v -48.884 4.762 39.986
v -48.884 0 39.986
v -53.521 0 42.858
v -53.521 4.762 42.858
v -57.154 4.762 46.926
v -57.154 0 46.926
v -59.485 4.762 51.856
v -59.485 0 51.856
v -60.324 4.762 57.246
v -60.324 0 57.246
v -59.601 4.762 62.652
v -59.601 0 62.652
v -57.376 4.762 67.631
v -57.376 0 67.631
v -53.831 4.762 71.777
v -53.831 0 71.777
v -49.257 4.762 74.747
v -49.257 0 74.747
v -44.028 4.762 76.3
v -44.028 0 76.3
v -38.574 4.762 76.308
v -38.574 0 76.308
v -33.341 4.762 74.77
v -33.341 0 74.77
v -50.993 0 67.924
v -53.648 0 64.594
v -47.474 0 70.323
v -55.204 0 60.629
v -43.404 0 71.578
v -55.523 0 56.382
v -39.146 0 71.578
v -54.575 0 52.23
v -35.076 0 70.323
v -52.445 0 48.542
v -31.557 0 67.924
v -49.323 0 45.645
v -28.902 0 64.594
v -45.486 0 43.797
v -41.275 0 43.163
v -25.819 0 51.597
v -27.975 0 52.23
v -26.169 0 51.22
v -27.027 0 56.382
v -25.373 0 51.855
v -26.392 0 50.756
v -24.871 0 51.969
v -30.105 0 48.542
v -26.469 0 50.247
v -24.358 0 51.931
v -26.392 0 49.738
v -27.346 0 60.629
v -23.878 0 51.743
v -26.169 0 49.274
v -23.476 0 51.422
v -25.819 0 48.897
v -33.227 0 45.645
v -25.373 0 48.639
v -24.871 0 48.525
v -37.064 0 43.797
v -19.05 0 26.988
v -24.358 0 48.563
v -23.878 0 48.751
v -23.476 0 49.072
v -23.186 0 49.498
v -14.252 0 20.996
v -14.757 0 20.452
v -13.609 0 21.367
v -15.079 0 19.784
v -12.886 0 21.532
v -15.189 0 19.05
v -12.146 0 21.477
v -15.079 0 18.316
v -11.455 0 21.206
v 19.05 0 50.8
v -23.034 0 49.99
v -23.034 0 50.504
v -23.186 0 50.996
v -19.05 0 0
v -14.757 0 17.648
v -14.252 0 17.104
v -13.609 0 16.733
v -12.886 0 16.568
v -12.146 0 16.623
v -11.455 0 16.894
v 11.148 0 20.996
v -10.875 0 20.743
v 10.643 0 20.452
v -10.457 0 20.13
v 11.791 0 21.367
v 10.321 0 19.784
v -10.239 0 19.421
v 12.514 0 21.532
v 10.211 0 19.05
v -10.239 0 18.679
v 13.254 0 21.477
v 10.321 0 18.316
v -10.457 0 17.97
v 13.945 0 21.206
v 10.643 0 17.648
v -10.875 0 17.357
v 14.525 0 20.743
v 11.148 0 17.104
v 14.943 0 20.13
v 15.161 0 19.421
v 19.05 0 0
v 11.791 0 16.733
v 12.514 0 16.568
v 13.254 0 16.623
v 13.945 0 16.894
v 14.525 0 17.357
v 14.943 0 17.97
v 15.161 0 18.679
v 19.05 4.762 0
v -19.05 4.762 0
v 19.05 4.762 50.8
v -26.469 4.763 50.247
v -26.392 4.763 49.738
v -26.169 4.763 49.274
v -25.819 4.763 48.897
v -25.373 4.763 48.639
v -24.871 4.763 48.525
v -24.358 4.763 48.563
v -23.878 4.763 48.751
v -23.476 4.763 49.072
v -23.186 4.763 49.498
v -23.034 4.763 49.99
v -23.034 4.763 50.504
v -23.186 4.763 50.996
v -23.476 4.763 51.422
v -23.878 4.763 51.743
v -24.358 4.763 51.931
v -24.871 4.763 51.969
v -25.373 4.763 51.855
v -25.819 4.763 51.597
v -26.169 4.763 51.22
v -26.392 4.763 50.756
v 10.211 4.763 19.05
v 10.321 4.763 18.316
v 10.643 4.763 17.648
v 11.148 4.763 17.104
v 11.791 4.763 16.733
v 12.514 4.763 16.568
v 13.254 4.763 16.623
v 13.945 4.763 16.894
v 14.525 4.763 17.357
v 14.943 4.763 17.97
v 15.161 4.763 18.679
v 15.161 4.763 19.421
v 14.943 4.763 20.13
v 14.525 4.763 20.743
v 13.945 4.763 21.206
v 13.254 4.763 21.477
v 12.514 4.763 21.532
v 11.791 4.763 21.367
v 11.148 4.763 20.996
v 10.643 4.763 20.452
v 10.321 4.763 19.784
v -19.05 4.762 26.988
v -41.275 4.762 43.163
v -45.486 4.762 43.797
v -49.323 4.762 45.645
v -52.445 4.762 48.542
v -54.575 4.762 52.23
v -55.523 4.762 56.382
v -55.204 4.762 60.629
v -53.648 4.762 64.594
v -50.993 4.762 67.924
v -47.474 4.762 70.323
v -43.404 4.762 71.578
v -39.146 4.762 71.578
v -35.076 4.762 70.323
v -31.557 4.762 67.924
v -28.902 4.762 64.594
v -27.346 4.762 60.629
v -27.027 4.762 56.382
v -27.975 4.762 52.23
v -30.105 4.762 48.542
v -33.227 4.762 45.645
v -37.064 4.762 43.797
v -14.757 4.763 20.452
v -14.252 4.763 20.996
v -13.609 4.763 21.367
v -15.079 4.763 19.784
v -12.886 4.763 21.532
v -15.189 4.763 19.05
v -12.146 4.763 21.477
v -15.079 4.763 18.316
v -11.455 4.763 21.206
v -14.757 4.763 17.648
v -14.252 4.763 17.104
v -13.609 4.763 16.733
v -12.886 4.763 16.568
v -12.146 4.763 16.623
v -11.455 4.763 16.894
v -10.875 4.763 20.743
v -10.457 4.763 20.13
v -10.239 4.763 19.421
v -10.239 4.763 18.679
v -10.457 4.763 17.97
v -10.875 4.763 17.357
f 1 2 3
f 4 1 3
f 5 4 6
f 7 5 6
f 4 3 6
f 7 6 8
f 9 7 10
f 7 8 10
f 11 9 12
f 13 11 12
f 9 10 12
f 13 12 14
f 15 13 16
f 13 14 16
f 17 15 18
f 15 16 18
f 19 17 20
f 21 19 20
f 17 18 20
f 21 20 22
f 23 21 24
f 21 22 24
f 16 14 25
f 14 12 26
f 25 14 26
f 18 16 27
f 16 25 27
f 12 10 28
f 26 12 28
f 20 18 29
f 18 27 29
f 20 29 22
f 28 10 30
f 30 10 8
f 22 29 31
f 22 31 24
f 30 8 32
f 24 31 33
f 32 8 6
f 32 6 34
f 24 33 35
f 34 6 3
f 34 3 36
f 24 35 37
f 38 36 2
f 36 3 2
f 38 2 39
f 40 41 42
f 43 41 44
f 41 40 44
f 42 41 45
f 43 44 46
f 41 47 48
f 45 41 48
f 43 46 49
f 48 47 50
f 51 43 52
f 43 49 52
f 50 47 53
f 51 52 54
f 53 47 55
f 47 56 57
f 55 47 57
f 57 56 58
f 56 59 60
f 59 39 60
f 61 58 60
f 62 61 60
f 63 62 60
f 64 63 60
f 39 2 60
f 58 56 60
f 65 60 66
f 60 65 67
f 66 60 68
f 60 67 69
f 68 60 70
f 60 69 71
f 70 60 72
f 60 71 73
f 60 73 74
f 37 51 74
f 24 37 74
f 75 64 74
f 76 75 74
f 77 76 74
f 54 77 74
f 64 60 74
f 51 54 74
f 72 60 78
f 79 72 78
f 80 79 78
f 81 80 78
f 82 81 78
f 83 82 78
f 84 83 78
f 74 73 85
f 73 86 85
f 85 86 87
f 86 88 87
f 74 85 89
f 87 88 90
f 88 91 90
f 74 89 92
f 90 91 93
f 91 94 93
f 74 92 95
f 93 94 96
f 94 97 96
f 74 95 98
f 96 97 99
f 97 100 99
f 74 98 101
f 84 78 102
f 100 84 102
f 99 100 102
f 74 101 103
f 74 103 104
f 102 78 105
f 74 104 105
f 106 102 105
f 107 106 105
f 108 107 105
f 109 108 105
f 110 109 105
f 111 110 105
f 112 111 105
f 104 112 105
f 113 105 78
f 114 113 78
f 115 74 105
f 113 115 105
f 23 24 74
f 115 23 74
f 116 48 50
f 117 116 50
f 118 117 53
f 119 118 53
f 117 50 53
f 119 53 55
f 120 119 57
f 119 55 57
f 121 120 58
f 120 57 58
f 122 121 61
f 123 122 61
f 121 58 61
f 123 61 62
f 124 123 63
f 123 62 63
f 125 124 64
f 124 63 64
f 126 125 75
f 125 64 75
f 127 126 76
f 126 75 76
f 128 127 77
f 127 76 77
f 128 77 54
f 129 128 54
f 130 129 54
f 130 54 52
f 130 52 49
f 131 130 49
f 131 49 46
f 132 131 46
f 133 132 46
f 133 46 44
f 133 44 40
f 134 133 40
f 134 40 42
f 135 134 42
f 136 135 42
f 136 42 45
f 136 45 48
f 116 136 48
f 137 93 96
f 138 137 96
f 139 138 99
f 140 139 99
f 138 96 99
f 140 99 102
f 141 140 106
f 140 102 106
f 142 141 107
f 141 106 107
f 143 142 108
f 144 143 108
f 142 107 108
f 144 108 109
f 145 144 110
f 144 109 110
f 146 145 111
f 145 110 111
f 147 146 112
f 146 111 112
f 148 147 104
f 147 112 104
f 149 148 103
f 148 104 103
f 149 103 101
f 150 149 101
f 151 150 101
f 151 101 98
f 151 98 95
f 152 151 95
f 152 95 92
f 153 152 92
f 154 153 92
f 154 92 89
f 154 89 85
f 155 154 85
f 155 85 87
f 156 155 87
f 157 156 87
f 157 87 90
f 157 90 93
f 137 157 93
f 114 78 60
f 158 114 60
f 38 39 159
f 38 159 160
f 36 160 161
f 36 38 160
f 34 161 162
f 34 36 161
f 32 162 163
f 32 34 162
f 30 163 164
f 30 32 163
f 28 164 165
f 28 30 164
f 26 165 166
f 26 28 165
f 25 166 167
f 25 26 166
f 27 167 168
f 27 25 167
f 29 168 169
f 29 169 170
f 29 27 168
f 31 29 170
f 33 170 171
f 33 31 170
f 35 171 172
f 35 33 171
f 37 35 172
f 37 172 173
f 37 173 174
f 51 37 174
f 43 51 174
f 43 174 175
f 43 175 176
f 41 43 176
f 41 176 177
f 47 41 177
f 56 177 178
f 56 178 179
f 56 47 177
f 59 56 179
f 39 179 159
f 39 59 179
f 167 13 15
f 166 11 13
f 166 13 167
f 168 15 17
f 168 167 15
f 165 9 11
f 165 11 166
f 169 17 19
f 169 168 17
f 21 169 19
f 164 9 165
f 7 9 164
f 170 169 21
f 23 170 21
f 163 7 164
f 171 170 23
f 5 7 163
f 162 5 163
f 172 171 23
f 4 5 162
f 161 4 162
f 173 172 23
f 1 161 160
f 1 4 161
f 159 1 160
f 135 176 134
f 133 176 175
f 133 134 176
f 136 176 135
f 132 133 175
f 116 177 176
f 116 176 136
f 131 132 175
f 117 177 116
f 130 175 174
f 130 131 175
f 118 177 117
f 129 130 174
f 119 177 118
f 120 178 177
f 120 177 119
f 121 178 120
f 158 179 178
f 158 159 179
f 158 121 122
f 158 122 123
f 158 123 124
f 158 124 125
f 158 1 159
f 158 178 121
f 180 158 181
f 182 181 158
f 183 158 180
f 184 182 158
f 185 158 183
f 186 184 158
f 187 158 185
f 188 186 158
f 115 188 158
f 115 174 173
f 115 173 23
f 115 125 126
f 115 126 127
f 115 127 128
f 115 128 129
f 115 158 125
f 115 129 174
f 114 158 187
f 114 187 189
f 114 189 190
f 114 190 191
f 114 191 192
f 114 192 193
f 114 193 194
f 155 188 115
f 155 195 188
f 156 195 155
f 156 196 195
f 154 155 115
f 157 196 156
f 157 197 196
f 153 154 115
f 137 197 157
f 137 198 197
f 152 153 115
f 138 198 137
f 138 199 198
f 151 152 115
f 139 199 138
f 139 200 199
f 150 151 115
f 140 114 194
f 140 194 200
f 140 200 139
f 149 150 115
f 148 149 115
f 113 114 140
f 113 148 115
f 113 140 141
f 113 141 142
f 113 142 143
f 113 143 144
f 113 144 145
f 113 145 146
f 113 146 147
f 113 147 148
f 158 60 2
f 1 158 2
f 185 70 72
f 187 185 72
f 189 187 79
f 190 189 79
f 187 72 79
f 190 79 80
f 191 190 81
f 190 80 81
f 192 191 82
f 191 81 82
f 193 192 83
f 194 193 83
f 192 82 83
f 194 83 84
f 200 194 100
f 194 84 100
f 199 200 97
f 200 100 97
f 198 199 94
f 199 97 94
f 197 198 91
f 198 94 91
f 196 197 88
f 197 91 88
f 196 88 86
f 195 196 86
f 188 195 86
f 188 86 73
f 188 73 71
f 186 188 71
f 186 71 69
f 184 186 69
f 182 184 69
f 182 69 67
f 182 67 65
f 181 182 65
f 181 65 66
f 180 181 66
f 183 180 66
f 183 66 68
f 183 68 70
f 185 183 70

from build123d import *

# Parameters (mm, degrees)
SKETCH2_R                 = 14.2875
BOSS_EXTRUDE1_DEPTH       = 4.7625
TAP_DRILL_FOR_8_32_TAP1_D = 3.4544
F_10_CLEARANCE_HOLE1_D    = 4.9784


with BuildPart() as part:
    # Sketch2 → Boss-Extrude1 (new body)
    with BuildSketch(Plane(origin=(0, 0, 0), x_dir=(1, 0, 0), z_dir=(0, 1, 0))):
        with BuildLine():
            Line((19.05, 0), (-19.05, 0))
            Line((-19.05, 0), (-19.05, -26.9875))
            Line((-19.05, -26.9875), (-48.883968147, -39.985679272))
            ThreePointArc((-48.883968147, -39.985679272), (-58.667673568, -65.221680031), (-33.341491014, -74.769512421))
            Line((-33.341491014, -74.769512421), (19.05, -50.8))
            Line((19.05, -50.8), (19.05, 0))
        make_face()
        with Locations(Location((-41.275, -57.450103217, 0), (0, 0, 90))):
            Circle(SKETCH2_R, mode=Mode.SUBTRACT)
    extrude(amount=BOSS_EXTRUDE1_DEPTH)

    # Tap Drill for #8-32 Tap1 (through all)
    with Locations(Plane(origin=(0, 4.7625, 0), x_dir=(1, 0, 0), z_dir=(0, 1, 0))):
        with Locations((-24.742011998, -50.246946705)):
            Hole(TAP_DRILL_FOR_8_32_TAP1_D / 2)

    # #10 Clearance Hole1 (through all)
    with Locations(Plane(origin=(0, 4.7625, 0), x_dir=(1, 0, 0), z_dir=(0, 1, 0))):
        with Locations((-12.7, -19.05), (12.7, -19.05)):
            Hole(F_10_CLEARANCE_HOLE1_D / 2)


solid = part.part
